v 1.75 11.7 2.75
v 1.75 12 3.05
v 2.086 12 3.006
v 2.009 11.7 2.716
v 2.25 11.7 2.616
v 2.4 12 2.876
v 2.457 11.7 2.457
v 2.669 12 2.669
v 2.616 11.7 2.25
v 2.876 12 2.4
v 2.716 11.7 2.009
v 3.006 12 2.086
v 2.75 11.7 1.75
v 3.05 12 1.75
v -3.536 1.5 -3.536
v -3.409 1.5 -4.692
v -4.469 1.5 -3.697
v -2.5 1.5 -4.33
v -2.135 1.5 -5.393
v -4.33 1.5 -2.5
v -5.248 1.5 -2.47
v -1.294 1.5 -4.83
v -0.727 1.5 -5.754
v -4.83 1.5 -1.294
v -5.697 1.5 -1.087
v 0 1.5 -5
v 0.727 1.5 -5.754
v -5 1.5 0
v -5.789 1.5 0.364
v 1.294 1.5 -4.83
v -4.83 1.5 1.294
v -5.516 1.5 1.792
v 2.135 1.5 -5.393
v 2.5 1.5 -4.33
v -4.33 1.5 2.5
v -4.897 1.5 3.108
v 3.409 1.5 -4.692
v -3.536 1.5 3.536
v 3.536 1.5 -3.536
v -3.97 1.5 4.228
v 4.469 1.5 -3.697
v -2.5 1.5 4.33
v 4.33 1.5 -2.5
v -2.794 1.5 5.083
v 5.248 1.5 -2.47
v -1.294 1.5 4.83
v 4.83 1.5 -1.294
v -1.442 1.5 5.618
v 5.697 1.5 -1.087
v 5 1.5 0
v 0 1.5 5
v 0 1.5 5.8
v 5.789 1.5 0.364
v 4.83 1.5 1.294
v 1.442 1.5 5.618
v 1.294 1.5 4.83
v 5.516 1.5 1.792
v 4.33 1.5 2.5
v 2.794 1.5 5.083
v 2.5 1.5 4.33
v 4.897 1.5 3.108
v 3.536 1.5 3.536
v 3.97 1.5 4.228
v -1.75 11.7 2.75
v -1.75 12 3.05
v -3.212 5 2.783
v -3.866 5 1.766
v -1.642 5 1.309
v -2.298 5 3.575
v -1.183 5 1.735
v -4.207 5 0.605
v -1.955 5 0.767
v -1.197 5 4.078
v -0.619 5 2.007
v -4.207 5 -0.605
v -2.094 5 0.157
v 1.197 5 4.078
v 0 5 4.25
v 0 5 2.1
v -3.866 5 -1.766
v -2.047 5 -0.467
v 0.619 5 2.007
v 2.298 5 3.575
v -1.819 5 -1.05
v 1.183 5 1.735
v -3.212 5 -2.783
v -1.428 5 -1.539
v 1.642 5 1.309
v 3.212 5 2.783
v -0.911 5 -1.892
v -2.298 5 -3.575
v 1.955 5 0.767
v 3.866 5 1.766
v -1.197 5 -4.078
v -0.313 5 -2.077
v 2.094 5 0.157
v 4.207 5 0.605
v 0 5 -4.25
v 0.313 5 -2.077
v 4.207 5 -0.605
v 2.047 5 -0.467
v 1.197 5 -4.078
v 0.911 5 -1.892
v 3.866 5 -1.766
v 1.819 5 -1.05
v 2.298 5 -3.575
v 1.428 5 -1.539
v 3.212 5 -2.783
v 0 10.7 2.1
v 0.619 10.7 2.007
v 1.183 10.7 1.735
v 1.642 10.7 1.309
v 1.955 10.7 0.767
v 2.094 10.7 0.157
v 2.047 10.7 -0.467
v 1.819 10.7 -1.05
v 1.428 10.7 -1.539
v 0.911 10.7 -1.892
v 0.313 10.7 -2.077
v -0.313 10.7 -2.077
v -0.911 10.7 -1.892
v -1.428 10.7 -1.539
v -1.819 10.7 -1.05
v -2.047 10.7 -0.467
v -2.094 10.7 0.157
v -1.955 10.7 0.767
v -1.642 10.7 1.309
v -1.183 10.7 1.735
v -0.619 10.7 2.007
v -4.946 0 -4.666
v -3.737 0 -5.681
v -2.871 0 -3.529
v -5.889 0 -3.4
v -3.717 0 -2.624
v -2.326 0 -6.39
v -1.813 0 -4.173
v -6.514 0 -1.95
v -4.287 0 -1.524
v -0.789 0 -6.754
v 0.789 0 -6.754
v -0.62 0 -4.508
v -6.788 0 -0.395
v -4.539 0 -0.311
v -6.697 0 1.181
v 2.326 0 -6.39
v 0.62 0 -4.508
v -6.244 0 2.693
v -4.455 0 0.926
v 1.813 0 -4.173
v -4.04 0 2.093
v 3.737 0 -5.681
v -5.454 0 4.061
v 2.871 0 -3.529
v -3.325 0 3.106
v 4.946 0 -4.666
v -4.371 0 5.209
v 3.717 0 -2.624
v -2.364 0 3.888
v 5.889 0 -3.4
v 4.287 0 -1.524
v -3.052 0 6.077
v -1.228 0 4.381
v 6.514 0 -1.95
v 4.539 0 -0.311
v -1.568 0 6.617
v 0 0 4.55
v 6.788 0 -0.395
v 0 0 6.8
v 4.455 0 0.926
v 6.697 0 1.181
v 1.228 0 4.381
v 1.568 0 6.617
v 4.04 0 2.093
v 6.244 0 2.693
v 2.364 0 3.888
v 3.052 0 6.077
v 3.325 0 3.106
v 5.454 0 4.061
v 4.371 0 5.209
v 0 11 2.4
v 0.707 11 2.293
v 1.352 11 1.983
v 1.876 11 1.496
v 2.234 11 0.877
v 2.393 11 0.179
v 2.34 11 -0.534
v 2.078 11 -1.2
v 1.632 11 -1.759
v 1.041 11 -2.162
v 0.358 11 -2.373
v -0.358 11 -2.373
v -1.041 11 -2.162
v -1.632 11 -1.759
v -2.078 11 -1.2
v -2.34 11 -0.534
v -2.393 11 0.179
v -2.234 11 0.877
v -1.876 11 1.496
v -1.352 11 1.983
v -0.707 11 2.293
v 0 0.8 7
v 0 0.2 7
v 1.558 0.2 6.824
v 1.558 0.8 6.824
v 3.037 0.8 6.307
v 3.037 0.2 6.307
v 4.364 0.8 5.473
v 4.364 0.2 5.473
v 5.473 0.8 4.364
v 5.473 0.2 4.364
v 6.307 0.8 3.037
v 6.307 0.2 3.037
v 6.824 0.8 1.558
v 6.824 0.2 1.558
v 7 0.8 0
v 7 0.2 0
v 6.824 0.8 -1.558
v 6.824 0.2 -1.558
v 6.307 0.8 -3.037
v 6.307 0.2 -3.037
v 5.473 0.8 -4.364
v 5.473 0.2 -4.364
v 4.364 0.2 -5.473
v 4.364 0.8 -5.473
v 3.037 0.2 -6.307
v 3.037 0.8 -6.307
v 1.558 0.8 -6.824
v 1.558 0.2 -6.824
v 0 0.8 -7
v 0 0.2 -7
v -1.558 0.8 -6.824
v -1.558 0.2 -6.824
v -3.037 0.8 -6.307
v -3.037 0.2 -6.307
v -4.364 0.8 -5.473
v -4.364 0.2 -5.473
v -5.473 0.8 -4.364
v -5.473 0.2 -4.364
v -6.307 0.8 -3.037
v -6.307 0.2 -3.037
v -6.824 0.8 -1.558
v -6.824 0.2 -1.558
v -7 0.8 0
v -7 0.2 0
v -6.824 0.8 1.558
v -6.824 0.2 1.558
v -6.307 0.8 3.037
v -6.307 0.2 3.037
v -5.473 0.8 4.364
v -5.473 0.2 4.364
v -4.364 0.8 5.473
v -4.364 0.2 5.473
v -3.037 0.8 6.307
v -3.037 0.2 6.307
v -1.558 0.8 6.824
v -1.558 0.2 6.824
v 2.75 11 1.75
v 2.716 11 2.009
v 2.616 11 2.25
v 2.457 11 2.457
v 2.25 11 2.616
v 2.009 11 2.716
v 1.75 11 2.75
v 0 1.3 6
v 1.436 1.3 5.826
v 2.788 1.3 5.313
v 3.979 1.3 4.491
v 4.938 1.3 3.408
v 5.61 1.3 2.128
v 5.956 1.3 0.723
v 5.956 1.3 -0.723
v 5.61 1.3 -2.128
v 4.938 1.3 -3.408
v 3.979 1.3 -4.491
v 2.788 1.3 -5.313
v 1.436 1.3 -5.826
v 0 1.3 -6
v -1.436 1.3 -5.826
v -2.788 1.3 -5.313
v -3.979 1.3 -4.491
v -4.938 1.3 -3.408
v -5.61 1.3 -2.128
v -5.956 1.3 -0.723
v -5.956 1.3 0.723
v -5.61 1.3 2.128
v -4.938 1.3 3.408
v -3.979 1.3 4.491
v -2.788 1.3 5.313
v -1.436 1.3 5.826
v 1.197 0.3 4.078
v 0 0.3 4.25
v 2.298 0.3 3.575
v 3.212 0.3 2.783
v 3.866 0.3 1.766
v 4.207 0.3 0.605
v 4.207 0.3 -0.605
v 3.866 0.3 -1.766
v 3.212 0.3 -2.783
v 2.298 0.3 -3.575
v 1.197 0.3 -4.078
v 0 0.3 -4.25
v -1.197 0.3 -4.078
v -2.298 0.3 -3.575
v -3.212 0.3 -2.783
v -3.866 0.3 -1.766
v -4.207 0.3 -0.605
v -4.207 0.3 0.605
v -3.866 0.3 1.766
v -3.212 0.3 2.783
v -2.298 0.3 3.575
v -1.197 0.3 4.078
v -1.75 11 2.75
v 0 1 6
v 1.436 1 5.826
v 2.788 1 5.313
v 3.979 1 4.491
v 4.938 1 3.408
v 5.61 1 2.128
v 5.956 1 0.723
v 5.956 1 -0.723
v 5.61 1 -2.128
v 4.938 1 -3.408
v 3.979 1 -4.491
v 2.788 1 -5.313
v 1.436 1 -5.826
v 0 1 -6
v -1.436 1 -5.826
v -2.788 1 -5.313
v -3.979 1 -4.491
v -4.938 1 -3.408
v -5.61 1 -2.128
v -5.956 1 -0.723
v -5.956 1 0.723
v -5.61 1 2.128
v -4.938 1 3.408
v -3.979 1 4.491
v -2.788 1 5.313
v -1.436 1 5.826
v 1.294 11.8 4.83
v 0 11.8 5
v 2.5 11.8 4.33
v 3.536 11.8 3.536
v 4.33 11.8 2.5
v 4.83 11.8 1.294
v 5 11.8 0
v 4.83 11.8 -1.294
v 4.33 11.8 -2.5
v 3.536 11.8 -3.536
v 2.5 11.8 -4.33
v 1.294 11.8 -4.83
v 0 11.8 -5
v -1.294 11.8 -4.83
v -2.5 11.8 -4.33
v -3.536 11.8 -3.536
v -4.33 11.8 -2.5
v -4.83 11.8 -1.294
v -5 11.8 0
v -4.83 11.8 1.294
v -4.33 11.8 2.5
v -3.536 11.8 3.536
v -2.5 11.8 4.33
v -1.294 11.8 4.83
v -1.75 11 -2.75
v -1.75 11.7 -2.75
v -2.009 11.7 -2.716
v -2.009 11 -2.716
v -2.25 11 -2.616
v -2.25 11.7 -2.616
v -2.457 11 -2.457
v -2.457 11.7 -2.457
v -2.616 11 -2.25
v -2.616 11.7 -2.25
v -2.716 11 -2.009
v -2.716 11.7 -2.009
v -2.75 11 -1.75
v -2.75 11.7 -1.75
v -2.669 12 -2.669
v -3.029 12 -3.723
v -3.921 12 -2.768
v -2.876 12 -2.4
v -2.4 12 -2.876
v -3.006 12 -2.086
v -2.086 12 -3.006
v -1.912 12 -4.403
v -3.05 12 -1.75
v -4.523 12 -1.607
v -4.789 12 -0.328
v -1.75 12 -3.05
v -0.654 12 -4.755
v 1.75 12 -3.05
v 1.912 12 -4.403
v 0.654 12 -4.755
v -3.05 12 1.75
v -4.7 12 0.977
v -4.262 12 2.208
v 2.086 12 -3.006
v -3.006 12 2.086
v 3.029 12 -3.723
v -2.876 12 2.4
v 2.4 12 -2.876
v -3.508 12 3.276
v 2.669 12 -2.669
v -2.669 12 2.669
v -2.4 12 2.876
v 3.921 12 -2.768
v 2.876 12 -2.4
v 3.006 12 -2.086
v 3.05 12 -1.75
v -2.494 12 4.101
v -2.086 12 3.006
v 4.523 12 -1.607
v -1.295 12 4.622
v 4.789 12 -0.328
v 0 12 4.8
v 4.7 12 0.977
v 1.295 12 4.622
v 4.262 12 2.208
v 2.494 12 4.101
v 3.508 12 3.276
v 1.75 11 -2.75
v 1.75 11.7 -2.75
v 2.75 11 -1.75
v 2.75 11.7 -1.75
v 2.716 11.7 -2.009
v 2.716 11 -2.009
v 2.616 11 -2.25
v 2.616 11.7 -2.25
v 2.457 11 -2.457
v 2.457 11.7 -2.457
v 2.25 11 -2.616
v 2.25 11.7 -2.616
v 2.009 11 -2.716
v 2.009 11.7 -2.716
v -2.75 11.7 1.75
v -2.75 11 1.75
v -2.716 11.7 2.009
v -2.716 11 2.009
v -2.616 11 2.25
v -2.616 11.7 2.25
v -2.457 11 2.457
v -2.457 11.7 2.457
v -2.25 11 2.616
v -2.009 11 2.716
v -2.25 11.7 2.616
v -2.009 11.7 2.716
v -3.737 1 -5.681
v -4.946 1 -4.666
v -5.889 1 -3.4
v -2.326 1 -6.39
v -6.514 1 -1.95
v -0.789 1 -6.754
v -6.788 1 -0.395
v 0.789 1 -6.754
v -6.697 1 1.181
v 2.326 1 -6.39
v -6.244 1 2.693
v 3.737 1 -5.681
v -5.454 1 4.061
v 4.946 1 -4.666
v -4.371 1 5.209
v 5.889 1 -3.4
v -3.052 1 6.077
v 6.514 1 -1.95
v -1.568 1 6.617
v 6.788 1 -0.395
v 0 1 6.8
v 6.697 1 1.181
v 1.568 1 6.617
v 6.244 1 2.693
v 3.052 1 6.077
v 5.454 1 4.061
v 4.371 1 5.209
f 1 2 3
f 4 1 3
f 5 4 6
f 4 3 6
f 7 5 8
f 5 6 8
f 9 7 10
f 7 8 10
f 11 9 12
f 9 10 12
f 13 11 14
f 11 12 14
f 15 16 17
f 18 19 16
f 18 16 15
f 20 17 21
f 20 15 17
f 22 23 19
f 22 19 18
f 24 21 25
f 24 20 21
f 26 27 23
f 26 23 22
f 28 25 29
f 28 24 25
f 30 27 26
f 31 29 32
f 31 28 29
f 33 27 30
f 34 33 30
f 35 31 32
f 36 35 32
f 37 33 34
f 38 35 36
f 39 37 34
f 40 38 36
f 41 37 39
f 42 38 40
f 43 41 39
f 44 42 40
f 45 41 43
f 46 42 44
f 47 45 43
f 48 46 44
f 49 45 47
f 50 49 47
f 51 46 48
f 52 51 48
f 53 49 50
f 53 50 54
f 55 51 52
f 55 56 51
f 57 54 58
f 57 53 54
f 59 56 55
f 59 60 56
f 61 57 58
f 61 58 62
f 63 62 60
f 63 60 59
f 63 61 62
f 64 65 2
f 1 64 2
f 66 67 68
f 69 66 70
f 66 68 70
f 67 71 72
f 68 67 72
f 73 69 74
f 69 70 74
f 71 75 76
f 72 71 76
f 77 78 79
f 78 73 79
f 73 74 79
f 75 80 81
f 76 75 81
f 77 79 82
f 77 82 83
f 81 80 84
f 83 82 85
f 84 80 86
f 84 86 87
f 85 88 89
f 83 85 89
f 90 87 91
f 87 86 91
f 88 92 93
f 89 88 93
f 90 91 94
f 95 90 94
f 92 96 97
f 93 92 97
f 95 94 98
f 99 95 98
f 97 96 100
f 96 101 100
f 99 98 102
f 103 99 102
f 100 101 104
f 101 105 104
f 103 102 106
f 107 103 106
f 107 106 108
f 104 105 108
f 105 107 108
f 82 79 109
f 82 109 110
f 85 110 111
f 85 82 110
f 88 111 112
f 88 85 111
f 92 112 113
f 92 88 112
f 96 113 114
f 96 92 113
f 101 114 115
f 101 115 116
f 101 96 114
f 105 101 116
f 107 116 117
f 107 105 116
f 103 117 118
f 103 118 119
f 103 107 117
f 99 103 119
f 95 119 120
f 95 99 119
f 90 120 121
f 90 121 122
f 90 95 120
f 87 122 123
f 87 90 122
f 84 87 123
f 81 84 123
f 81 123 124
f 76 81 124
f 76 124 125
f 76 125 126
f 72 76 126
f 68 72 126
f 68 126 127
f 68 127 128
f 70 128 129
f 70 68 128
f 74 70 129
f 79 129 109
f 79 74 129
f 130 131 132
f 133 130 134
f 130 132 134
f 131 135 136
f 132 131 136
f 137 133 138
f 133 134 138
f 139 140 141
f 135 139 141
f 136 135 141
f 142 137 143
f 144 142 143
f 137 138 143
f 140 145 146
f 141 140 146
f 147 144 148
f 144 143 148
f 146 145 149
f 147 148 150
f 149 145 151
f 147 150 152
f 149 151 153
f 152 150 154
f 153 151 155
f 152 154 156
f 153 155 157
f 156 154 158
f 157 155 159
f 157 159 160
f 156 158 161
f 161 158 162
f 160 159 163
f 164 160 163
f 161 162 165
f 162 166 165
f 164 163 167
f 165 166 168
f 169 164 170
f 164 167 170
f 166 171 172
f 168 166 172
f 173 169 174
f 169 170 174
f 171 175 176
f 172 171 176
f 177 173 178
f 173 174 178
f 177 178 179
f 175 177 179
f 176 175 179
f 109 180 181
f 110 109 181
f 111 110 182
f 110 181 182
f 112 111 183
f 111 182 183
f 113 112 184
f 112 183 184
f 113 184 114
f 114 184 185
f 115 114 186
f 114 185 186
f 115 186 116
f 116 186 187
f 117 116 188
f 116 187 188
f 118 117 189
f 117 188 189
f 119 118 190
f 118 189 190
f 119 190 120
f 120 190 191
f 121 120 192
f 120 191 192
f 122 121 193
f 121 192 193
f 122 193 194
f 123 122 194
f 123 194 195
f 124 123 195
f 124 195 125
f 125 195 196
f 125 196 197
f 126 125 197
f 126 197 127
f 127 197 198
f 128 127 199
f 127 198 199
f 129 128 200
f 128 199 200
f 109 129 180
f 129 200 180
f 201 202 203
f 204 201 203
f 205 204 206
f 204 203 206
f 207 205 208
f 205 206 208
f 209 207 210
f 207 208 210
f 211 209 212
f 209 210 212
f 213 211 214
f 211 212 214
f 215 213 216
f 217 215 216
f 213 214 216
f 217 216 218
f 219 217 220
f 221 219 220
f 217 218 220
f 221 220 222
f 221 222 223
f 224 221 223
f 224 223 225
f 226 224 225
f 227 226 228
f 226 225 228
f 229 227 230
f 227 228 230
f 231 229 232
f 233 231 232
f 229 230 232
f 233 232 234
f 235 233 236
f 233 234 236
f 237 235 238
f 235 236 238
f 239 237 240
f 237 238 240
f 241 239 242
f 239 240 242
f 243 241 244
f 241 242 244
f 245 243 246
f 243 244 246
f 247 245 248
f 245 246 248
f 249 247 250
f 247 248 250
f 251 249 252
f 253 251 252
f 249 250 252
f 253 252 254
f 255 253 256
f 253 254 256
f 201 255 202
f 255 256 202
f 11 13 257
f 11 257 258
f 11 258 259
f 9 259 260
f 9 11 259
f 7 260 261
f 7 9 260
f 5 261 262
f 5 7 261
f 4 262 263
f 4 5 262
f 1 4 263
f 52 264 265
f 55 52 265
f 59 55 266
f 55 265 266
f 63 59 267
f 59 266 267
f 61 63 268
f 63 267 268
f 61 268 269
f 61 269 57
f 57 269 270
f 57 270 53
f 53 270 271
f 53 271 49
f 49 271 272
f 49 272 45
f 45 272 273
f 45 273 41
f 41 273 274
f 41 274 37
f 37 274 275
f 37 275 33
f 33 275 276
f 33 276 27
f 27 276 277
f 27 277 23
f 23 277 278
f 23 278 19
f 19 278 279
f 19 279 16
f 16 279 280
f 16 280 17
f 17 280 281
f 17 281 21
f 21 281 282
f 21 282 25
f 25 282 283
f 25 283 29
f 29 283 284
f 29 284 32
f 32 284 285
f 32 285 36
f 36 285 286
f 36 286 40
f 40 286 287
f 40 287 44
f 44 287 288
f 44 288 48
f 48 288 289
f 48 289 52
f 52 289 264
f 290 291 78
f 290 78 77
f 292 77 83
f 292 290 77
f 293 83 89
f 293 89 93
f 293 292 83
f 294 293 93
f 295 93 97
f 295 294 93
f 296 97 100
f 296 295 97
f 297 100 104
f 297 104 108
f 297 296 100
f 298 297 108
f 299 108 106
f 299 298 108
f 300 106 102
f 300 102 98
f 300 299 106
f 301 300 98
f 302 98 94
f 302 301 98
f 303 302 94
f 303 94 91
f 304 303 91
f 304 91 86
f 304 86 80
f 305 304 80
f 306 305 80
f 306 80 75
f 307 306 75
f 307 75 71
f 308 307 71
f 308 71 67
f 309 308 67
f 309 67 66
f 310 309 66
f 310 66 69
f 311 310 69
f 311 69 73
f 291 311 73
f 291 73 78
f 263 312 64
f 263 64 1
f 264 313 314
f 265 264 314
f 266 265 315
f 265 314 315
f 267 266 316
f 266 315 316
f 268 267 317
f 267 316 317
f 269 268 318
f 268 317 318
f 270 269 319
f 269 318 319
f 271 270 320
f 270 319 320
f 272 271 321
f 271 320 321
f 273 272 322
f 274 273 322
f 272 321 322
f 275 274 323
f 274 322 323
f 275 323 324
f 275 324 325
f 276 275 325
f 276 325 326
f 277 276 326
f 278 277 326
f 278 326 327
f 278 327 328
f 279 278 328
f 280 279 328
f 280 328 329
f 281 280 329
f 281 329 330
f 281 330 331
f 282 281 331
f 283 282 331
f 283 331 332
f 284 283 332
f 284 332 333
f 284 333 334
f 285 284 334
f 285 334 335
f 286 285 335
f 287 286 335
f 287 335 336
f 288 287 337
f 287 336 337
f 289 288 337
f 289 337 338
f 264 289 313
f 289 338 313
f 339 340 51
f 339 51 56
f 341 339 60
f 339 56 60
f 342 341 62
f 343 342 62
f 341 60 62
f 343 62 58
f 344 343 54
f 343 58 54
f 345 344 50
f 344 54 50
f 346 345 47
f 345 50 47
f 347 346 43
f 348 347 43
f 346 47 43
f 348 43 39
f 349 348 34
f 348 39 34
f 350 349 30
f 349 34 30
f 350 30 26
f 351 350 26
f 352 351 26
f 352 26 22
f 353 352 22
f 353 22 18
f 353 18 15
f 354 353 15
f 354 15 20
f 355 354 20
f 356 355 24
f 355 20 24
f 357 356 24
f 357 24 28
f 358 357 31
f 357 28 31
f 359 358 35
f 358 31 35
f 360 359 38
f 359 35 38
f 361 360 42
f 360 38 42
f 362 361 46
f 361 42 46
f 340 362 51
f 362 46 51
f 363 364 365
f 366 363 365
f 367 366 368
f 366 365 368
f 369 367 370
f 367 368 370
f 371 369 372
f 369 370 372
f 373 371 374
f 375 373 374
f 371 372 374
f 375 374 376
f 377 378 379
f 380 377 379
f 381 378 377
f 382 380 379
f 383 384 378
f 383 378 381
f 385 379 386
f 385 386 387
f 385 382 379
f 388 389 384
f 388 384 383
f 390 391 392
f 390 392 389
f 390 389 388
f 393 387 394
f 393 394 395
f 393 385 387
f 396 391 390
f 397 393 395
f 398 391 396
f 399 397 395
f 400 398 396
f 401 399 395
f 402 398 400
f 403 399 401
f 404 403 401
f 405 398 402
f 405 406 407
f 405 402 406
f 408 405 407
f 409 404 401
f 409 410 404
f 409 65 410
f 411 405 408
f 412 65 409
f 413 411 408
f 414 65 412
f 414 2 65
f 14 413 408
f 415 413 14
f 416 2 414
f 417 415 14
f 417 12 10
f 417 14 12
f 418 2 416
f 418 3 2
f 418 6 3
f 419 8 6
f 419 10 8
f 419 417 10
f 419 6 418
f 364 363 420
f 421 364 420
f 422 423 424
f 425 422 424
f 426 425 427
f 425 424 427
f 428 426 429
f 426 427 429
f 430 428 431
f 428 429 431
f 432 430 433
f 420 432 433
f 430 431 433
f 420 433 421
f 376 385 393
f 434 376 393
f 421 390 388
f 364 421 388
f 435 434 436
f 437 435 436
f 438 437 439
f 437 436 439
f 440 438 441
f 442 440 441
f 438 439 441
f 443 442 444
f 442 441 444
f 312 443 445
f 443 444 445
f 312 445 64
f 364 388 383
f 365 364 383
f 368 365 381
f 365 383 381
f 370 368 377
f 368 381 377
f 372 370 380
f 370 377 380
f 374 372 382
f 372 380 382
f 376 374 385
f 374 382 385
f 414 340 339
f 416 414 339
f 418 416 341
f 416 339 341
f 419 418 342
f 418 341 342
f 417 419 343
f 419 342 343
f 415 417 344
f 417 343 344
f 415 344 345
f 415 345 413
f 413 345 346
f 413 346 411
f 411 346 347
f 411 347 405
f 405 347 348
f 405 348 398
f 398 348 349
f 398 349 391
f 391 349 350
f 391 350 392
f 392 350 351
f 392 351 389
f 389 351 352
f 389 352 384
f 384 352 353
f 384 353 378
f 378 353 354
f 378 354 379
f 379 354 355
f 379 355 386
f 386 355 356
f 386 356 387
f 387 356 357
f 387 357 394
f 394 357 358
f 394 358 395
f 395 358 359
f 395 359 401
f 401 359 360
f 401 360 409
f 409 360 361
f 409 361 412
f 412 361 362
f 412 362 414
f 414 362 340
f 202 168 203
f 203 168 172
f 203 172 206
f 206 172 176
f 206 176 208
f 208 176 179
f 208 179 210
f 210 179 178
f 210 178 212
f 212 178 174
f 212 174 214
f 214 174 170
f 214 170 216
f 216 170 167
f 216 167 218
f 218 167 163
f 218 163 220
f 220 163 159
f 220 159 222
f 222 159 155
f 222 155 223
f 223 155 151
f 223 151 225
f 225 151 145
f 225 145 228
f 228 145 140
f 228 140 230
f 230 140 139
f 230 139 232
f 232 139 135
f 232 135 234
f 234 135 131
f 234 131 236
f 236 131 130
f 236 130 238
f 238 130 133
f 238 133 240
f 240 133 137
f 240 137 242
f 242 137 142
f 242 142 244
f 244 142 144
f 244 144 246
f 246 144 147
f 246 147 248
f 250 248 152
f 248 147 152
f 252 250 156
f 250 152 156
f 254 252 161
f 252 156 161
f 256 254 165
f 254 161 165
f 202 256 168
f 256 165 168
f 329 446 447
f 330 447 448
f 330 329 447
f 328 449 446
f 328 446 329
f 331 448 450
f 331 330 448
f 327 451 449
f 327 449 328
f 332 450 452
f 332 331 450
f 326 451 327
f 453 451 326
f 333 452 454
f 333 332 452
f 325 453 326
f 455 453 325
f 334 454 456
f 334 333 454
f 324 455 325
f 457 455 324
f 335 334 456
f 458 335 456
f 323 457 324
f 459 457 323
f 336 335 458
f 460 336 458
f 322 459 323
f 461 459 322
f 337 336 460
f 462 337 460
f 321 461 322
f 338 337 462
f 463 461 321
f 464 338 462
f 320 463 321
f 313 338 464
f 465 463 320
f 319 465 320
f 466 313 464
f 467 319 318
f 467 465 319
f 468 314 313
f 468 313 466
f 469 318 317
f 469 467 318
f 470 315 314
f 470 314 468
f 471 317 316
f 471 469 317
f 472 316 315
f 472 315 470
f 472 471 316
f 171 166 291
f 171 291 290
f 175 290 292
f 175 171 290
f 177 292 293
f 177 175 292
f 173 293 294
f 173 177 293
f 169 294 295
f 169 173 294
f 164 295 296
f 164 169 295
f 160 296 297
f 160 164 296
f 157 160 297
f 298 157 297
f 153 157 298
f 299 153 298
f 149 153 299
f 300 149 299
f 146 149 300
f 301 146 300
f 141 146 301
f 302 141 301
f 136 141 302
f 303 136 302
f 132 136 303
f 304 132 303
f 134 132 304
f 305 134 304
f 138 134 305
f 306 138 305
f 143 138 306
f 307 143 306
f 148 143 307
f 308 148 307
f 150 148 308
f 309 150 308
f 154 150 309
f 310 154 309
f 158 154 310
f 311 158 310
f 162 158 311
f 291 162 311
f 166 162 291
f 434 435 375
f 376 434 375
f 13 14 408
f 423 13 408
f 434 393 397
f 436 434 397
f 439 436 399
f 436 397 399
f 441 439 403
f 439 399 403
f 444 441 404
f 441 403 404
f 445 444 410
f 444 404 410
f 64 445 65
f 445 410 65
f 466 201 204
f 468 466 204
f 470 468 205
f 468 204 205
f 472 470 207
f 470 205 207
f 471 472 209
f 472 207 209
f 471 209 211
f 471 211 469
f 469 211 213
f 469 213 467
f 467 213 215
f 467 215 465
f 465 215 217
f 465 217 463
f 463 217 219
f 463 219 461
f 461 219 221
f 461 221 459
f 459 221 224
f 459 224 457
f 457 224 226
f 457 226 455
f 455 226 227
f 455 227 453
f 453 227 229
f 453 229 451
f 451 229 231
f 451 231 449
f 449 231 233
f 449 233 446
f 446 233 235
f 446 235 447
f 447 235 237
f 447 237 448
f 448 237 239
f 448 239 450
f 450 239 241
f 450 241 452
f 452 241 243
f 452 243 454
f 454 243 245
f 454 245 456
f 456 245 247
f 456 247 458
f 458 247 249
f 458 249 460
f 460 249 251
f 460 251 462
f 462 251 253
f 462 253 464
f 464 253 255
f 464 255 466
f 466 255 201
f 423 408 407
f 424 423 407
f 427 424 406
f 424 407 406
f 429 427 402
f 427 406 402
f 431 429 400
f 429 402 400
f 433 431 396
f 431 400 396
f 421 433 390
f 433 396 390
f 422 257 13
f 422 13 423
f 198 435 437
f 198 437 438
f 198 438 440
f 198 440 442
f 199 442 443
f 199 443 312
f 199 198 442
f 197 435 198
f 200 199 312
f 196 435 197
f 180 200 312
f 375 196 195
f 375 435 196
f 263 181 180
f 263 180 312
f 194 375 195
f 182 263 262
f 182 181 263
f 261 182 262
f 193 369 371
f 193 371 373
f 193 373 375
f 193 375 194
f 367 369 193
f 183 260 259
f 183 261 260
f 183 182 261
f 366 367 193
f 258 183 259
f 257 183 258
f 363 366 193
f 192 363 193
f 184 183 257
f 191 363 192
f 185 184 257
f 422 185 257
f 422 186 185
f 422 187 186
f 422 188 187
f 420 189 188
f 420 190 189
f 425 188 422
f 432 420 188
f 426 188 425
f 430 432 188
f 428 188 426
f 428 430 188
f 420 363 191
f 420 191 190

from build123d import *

# Parameters (mm, degrees)
SKETCH_1_R      = 7
SKETCH_1_R_2    = 6
EXTRUDE_1_DEPTH = 1
SKETCH_1_4_R    = 6
SKETCH_1_4_R_2  = 5
EXTRUDE_2_DEPTH = 1.5
SKETCH_1_5_R    = 5
SKETCH_1_5_R_2  = 4.25
EXTRUDE_3_DEPTH = 12
EXTRUDE_START   = 5
SKETCH_1_6_R    = 4.25
SKETCH_1_6_W    = 5.5
SKETCH_1_6_H    = 5.5
EXTRUDE_4_DEPTH = 7
SKETCH_1_7_W    = 5.5
SKETCH_1_7_H    = 5.5
SKETCH_1_7_R    = 2.1
EXTRUDE_5_DEPTH = 6
FILLET_1_R      = 1
CHAMFER_1_SIZE  = 0.2
CHAMFER_2_SIZE  = 0.3
CHAMFER_3_SIZE  = 0.3


with BuildPart() as part:
    # 스케치1 → 보스-돌출1 (new body)
    with BuildSketch(Plane(origin=(0, 0, 0), x_dir=(1, 0, 0), z_dir=(0, 1, 0))):
        Circle(SKETCH_1_R)
        Circle(SKETCH_1_R_2, mode=Mode.SUBTRACT)
    extrude(amount=EXTRUDE_1_DEPTH)

    # 스케치1<4> → 보스-돌출2 (add)
    with BuildSketch(Plane(origin=(0, 0, 0), x_dir=(1, 0, 0), z_dir=(0, 1, 0))):
        Circle(SKETCH_1_4_R)
        Circle(SKETCH_1_4_R_2, mode=Mode.SUBTRACT)
    extrude(amount=EXTRUDE_2_DEPTH)

    # 스케치1<5> → 보스-돌출3 (add)
    with BuildSketch(Plane(origin=(0, 0, 0), x_dir=(1, 0, 0), z_dir=(0, 1, 0))):
        Circle(SKETCH_1_5_R)
        Circle(SKETCH_1_5_R_2, mode=Mode.SUBTRACT)
    extrude(amount=EXTRUDE_3_DEPTH)

    # 스케치1<6> → 보스-돌출4 (add)
    with BuildSketch(Plane(origin=(0, 0, 0), x_dir=(1, 0, 0), z_dir=(0, 1, 0)).offset(EXTRUDE_START)):
        Circle(SKETCH_1_6_R)
        Rectangle(SKETCH_1_6_W, SKETCH_1_6_H, mode=Mode.SUBTRACT)
    extrude(amount=EXTRUDE_4_DEPTH)

    # 스케치1<7> → 보스-돌출5 (add)
    with BuildSketch(Plane(origin=(0, 0, 0), x_dir=(1, 0, 0), z_dir=(0, 1, 0)).offset(EXTRUDE_START)):
        Rectangle(SKETCH_1_7_W, SKETCH_1_7_H)
        Circle(SKETCH_1_7_R, mode=Mode.SUBTRACT)
    extrude(amount=EXTRUDE_5_DEPTH)

    # 필렛1
    fillet_1_edges = [part.edges().sort_by_distance(p)[0] for p in [
        (2.75, 11.5, 2.75),
        (-2.75, 11.5, 2.75),
        (2.75, 11.5, -2.75),
        (-2.75, 11.5, -2.75),
    ]]
    fillet(fillet_1_edges, radius=FILLET_1_R)

    # 모따기1
    chamfer_1_edges = [part.edges().sort_by_distance(p)[0] for p in [
        (-5, 12, 0),
        (-7, 1, 0),
        (-7, 0, 0),
        (-6, 1.5, 0),
    ]]
    chamfer(chamfer_1_edges, length=CHAMFER_1_SIZE)

    # 모따기2
    chamfer_2_edges = [part.edges().sort_by_distance(p)[0] for p in [
        (-4.25, 0, 0),
    ]]
    chamfer(chamfer_2_edges, length=CHAMFER_2_SIZE)

    # 모따기3
    chamfer_3_edges = [part.edges().sort_by_distance(p)[0] for p in [
        (-2.1, 11, 0),
        (0, 12, 2.75),
        (2.75, 12, 0),
        (-2.75, 12, 0),
        (0, 12, -2.75),
        (-2.457106781, 12, 2.457106781),
        (2.457106781, 12, 2.457106781),
        (-2.457106781, 12, -2.457106781),
        (2.457106781, 12, -2.457106781),
    ]]
    chamfer(chamfer_3_edges, length=CHAMFER_3_SIZE)


solid = part.part
